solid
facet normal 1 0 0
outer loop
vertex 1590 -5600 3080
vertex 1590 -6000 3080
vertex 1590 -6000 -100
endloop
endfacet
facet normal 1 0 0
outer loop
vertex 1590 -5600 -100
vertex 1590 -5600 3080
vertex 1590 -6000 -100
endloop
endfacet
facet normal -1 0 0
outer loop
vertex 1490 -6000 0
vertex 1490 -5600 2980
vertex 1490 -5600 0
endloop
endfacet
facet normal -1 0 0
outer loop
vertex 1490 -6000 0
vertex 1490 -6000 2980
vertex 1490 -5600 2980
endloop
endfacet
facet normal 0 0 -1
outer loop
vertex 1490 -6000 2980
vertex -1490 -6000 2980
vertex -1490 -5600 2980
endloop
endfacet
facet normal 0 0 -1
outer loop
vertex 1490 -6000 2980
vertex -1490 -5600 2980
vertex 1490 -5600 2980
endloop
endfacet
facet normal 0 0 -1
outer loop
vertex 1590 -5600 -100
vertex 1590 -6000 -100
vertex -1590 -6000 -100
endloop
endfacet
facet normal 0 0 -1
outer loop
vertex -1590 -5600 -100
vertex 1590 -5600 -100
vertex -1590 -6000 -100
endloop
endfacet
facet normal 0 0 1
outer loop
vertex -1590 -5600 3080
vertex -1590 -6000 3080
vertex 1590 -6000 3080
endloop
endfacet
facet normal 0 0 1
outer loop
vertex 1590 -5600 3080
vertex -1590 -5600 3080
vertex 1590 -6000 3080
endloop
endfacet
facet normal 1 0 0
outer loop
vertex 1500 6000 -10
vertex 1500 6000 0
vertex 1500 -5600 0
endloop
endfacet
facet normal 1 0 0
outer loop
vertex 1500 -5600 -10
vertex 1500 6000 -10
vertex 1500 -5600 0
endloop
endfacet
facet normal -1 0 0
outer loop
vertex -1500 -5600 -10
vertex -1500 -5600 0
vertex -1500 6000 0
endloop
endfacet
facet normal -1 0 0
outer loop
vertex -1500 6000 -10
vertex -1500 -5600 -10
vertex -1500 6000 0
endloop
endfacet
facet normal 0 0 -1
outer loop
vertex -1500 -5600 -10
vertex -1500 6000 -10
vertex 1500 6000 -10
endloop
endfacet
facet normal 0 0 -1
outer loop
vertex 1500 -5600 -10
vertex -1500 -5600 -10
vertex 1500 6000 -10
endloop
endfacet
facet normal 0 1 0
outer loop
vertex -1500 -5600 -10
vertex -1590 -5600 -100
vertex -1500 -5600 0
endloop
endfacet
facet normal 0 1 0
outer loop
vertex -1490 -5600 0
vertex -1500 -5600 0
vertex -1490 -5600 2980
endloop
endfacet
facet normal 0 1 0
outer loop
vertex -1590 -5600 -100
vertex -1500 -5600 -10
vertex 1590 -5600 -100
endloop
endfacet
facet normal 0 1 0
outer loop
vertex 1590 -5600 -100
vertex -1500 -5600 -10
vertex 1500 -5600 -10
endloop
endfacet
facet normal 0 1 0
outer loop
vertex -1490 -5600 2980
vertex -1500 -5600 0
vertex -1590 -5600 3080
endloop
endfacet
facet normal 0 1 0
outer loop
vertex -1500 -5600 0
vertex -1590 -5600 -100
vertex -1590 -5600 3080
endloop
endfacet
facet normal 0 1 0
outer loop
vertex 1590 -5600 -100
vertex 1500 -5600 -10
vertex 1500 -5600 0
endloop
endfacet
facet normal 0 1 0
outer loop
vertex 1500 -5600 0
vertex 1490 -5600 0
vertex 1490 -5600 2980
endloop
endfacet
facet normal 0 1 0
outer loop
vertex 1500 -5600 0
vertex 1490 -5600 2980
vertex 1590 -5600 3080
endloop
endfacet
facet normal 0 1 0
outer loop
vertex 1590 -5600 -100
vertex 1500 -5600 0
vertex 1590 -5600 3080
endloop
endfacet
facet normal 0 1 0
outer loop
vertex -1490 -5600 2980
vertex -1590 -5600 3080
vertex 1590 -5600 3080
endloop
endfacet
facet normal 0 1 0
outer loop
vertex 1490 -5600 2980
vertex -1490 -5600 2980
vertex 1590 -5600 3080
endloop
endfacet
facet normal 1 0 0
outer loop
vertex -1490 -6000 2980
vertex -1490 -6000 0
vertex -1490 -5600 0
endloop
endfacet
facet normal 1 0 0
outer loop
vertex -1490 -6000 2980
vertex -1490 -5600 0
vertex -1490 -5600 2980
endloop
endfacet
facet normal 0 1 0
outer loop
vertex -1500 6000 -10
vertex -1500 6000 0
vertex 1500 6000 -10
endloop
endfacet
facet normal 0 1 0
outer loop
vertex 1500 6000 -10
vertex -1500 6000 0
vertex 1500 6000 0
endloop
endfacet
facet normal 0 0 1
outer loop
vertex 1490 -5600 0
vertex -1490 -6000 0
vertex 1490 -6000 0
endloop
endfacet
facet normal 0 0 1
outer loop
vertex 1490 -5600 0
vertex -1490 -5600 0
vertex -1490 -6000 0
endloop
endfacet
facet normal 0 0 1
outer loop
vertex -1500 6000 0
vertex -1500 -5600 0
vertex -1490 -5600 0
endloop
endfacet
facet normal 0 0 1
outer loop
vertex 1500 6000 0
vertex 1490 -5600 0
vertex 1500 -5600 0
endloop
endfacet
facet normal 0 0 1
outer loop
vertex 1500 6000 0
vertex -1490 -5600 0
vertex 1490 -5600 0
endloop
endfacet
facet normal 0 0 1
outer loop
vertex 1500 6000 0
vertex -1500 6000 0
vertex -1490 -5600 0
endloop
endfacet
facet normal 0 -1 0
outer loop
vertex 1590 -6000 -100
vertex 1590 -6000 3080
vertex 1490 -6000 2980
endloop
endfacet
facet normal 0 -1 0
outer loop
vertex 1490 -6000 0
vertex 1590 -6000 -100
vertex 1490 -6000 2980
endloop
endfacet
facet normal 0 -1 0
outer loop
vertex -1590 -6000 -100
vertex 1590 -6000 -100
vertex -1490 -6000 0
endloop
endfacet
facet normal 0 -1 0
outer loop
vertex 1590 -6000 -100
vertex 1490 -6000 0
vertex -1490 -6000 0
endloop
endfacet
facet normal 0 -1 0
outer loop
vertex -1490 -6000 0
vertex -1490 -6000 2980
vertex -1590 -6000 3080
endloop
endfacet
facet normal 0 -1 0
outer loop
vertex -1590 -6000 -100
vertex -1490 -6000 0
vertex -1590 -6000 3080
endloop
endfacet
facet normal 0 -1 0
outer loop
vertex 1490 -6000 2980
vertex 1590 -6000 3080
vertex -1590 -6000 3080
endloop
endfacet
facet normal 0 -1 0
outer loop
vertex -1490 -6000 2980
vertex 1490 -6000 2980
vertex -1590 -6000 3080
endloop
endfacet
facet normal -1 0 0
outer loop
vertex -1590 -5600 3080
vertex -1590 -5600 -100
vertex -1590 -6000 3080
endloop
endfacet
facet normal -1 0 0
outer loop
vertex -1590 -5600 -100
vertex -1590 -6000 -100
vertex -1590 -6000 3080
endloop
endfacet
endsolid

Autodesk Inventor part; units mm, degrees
ref_plane "YZ Plane" through (0, 0, 0) normal (1, 0, 0) x (0, 1, 0)
ref_plane "XZ Plane" through (0, 0, 0) normal (0, 1, 0) x (-1, 0, 0)
ref_plane "XY Plane" through (0, 0, 0) normal (0, 0, 1) x (1, 0, 0)
sketch "Sketch1" plane through (0, 0, 0) normal (0, 0, 1) x (1, 0, 0)
  line L0 (1500, -6000) -> (-1500, -6000)
  line L1 (-1500, -6000) -> (-1500, 6000)
  line L2 (-1500, 6000) -> (1500, 6000)
  line L3 (1500, 6000) -> (1500, -6000)
  line L4 (1500, -6000) -> (-1500, 6000) construction
  line L5 (-1500, -6000) -> (1500, 6000) construction
  point P0 (0, 0)
  dimension "d0" = 3000
  dimension "d1" = 12000
extrude "Extrusion1" add sketch "Sketch1" against normal blind 10
sketch "Sketch2" plane through (-1500, -6000, 0) normal (0, -1, 0) x (1, 0, 0)
  line L0 (0, 0) -> (3000, 0) projected
  line L1 (0, 0) -> (0, -10) projected
  line L2 (3000, -10) -> (0, -10) projected
  line L3 (3000, 0) -> (3000, -10) projected
  line L4 (10, 2980) -> (2990, 2980)
  line L5 (2990, 2980) -> (2990, 0)
  line L6 (2990, 0) -> (10, 0)
  line L7 (10, 0) -> (10, 2980)
  line L8 (10, 2980) -> (2990, 0) construction
  line L9 (2990, 2980) -> (10, 0) construction
  line L10 (0, 0) -> (3000, 0) projected
  line L11 (-90, 3080) -> (3090, 3080)
  line L12 (3090, 3080) -> (3090, -100)
  line L13 (3090, -100) -> (-90, -100)
  line L14 (-90, -100) -> (-90, 3080)
  point P0 (1500, 0)
  point P1 (1500, 1490)
  point P2 (1500, 0)
  point P3 (2990, 0)
  dimension "d4" = 2980
  dimension "d5" = 2980
  dimension "d6" = 100
extrude "Extrusion2" add sketch "Sketch2" against normal blind 400
properties part number "floor"
